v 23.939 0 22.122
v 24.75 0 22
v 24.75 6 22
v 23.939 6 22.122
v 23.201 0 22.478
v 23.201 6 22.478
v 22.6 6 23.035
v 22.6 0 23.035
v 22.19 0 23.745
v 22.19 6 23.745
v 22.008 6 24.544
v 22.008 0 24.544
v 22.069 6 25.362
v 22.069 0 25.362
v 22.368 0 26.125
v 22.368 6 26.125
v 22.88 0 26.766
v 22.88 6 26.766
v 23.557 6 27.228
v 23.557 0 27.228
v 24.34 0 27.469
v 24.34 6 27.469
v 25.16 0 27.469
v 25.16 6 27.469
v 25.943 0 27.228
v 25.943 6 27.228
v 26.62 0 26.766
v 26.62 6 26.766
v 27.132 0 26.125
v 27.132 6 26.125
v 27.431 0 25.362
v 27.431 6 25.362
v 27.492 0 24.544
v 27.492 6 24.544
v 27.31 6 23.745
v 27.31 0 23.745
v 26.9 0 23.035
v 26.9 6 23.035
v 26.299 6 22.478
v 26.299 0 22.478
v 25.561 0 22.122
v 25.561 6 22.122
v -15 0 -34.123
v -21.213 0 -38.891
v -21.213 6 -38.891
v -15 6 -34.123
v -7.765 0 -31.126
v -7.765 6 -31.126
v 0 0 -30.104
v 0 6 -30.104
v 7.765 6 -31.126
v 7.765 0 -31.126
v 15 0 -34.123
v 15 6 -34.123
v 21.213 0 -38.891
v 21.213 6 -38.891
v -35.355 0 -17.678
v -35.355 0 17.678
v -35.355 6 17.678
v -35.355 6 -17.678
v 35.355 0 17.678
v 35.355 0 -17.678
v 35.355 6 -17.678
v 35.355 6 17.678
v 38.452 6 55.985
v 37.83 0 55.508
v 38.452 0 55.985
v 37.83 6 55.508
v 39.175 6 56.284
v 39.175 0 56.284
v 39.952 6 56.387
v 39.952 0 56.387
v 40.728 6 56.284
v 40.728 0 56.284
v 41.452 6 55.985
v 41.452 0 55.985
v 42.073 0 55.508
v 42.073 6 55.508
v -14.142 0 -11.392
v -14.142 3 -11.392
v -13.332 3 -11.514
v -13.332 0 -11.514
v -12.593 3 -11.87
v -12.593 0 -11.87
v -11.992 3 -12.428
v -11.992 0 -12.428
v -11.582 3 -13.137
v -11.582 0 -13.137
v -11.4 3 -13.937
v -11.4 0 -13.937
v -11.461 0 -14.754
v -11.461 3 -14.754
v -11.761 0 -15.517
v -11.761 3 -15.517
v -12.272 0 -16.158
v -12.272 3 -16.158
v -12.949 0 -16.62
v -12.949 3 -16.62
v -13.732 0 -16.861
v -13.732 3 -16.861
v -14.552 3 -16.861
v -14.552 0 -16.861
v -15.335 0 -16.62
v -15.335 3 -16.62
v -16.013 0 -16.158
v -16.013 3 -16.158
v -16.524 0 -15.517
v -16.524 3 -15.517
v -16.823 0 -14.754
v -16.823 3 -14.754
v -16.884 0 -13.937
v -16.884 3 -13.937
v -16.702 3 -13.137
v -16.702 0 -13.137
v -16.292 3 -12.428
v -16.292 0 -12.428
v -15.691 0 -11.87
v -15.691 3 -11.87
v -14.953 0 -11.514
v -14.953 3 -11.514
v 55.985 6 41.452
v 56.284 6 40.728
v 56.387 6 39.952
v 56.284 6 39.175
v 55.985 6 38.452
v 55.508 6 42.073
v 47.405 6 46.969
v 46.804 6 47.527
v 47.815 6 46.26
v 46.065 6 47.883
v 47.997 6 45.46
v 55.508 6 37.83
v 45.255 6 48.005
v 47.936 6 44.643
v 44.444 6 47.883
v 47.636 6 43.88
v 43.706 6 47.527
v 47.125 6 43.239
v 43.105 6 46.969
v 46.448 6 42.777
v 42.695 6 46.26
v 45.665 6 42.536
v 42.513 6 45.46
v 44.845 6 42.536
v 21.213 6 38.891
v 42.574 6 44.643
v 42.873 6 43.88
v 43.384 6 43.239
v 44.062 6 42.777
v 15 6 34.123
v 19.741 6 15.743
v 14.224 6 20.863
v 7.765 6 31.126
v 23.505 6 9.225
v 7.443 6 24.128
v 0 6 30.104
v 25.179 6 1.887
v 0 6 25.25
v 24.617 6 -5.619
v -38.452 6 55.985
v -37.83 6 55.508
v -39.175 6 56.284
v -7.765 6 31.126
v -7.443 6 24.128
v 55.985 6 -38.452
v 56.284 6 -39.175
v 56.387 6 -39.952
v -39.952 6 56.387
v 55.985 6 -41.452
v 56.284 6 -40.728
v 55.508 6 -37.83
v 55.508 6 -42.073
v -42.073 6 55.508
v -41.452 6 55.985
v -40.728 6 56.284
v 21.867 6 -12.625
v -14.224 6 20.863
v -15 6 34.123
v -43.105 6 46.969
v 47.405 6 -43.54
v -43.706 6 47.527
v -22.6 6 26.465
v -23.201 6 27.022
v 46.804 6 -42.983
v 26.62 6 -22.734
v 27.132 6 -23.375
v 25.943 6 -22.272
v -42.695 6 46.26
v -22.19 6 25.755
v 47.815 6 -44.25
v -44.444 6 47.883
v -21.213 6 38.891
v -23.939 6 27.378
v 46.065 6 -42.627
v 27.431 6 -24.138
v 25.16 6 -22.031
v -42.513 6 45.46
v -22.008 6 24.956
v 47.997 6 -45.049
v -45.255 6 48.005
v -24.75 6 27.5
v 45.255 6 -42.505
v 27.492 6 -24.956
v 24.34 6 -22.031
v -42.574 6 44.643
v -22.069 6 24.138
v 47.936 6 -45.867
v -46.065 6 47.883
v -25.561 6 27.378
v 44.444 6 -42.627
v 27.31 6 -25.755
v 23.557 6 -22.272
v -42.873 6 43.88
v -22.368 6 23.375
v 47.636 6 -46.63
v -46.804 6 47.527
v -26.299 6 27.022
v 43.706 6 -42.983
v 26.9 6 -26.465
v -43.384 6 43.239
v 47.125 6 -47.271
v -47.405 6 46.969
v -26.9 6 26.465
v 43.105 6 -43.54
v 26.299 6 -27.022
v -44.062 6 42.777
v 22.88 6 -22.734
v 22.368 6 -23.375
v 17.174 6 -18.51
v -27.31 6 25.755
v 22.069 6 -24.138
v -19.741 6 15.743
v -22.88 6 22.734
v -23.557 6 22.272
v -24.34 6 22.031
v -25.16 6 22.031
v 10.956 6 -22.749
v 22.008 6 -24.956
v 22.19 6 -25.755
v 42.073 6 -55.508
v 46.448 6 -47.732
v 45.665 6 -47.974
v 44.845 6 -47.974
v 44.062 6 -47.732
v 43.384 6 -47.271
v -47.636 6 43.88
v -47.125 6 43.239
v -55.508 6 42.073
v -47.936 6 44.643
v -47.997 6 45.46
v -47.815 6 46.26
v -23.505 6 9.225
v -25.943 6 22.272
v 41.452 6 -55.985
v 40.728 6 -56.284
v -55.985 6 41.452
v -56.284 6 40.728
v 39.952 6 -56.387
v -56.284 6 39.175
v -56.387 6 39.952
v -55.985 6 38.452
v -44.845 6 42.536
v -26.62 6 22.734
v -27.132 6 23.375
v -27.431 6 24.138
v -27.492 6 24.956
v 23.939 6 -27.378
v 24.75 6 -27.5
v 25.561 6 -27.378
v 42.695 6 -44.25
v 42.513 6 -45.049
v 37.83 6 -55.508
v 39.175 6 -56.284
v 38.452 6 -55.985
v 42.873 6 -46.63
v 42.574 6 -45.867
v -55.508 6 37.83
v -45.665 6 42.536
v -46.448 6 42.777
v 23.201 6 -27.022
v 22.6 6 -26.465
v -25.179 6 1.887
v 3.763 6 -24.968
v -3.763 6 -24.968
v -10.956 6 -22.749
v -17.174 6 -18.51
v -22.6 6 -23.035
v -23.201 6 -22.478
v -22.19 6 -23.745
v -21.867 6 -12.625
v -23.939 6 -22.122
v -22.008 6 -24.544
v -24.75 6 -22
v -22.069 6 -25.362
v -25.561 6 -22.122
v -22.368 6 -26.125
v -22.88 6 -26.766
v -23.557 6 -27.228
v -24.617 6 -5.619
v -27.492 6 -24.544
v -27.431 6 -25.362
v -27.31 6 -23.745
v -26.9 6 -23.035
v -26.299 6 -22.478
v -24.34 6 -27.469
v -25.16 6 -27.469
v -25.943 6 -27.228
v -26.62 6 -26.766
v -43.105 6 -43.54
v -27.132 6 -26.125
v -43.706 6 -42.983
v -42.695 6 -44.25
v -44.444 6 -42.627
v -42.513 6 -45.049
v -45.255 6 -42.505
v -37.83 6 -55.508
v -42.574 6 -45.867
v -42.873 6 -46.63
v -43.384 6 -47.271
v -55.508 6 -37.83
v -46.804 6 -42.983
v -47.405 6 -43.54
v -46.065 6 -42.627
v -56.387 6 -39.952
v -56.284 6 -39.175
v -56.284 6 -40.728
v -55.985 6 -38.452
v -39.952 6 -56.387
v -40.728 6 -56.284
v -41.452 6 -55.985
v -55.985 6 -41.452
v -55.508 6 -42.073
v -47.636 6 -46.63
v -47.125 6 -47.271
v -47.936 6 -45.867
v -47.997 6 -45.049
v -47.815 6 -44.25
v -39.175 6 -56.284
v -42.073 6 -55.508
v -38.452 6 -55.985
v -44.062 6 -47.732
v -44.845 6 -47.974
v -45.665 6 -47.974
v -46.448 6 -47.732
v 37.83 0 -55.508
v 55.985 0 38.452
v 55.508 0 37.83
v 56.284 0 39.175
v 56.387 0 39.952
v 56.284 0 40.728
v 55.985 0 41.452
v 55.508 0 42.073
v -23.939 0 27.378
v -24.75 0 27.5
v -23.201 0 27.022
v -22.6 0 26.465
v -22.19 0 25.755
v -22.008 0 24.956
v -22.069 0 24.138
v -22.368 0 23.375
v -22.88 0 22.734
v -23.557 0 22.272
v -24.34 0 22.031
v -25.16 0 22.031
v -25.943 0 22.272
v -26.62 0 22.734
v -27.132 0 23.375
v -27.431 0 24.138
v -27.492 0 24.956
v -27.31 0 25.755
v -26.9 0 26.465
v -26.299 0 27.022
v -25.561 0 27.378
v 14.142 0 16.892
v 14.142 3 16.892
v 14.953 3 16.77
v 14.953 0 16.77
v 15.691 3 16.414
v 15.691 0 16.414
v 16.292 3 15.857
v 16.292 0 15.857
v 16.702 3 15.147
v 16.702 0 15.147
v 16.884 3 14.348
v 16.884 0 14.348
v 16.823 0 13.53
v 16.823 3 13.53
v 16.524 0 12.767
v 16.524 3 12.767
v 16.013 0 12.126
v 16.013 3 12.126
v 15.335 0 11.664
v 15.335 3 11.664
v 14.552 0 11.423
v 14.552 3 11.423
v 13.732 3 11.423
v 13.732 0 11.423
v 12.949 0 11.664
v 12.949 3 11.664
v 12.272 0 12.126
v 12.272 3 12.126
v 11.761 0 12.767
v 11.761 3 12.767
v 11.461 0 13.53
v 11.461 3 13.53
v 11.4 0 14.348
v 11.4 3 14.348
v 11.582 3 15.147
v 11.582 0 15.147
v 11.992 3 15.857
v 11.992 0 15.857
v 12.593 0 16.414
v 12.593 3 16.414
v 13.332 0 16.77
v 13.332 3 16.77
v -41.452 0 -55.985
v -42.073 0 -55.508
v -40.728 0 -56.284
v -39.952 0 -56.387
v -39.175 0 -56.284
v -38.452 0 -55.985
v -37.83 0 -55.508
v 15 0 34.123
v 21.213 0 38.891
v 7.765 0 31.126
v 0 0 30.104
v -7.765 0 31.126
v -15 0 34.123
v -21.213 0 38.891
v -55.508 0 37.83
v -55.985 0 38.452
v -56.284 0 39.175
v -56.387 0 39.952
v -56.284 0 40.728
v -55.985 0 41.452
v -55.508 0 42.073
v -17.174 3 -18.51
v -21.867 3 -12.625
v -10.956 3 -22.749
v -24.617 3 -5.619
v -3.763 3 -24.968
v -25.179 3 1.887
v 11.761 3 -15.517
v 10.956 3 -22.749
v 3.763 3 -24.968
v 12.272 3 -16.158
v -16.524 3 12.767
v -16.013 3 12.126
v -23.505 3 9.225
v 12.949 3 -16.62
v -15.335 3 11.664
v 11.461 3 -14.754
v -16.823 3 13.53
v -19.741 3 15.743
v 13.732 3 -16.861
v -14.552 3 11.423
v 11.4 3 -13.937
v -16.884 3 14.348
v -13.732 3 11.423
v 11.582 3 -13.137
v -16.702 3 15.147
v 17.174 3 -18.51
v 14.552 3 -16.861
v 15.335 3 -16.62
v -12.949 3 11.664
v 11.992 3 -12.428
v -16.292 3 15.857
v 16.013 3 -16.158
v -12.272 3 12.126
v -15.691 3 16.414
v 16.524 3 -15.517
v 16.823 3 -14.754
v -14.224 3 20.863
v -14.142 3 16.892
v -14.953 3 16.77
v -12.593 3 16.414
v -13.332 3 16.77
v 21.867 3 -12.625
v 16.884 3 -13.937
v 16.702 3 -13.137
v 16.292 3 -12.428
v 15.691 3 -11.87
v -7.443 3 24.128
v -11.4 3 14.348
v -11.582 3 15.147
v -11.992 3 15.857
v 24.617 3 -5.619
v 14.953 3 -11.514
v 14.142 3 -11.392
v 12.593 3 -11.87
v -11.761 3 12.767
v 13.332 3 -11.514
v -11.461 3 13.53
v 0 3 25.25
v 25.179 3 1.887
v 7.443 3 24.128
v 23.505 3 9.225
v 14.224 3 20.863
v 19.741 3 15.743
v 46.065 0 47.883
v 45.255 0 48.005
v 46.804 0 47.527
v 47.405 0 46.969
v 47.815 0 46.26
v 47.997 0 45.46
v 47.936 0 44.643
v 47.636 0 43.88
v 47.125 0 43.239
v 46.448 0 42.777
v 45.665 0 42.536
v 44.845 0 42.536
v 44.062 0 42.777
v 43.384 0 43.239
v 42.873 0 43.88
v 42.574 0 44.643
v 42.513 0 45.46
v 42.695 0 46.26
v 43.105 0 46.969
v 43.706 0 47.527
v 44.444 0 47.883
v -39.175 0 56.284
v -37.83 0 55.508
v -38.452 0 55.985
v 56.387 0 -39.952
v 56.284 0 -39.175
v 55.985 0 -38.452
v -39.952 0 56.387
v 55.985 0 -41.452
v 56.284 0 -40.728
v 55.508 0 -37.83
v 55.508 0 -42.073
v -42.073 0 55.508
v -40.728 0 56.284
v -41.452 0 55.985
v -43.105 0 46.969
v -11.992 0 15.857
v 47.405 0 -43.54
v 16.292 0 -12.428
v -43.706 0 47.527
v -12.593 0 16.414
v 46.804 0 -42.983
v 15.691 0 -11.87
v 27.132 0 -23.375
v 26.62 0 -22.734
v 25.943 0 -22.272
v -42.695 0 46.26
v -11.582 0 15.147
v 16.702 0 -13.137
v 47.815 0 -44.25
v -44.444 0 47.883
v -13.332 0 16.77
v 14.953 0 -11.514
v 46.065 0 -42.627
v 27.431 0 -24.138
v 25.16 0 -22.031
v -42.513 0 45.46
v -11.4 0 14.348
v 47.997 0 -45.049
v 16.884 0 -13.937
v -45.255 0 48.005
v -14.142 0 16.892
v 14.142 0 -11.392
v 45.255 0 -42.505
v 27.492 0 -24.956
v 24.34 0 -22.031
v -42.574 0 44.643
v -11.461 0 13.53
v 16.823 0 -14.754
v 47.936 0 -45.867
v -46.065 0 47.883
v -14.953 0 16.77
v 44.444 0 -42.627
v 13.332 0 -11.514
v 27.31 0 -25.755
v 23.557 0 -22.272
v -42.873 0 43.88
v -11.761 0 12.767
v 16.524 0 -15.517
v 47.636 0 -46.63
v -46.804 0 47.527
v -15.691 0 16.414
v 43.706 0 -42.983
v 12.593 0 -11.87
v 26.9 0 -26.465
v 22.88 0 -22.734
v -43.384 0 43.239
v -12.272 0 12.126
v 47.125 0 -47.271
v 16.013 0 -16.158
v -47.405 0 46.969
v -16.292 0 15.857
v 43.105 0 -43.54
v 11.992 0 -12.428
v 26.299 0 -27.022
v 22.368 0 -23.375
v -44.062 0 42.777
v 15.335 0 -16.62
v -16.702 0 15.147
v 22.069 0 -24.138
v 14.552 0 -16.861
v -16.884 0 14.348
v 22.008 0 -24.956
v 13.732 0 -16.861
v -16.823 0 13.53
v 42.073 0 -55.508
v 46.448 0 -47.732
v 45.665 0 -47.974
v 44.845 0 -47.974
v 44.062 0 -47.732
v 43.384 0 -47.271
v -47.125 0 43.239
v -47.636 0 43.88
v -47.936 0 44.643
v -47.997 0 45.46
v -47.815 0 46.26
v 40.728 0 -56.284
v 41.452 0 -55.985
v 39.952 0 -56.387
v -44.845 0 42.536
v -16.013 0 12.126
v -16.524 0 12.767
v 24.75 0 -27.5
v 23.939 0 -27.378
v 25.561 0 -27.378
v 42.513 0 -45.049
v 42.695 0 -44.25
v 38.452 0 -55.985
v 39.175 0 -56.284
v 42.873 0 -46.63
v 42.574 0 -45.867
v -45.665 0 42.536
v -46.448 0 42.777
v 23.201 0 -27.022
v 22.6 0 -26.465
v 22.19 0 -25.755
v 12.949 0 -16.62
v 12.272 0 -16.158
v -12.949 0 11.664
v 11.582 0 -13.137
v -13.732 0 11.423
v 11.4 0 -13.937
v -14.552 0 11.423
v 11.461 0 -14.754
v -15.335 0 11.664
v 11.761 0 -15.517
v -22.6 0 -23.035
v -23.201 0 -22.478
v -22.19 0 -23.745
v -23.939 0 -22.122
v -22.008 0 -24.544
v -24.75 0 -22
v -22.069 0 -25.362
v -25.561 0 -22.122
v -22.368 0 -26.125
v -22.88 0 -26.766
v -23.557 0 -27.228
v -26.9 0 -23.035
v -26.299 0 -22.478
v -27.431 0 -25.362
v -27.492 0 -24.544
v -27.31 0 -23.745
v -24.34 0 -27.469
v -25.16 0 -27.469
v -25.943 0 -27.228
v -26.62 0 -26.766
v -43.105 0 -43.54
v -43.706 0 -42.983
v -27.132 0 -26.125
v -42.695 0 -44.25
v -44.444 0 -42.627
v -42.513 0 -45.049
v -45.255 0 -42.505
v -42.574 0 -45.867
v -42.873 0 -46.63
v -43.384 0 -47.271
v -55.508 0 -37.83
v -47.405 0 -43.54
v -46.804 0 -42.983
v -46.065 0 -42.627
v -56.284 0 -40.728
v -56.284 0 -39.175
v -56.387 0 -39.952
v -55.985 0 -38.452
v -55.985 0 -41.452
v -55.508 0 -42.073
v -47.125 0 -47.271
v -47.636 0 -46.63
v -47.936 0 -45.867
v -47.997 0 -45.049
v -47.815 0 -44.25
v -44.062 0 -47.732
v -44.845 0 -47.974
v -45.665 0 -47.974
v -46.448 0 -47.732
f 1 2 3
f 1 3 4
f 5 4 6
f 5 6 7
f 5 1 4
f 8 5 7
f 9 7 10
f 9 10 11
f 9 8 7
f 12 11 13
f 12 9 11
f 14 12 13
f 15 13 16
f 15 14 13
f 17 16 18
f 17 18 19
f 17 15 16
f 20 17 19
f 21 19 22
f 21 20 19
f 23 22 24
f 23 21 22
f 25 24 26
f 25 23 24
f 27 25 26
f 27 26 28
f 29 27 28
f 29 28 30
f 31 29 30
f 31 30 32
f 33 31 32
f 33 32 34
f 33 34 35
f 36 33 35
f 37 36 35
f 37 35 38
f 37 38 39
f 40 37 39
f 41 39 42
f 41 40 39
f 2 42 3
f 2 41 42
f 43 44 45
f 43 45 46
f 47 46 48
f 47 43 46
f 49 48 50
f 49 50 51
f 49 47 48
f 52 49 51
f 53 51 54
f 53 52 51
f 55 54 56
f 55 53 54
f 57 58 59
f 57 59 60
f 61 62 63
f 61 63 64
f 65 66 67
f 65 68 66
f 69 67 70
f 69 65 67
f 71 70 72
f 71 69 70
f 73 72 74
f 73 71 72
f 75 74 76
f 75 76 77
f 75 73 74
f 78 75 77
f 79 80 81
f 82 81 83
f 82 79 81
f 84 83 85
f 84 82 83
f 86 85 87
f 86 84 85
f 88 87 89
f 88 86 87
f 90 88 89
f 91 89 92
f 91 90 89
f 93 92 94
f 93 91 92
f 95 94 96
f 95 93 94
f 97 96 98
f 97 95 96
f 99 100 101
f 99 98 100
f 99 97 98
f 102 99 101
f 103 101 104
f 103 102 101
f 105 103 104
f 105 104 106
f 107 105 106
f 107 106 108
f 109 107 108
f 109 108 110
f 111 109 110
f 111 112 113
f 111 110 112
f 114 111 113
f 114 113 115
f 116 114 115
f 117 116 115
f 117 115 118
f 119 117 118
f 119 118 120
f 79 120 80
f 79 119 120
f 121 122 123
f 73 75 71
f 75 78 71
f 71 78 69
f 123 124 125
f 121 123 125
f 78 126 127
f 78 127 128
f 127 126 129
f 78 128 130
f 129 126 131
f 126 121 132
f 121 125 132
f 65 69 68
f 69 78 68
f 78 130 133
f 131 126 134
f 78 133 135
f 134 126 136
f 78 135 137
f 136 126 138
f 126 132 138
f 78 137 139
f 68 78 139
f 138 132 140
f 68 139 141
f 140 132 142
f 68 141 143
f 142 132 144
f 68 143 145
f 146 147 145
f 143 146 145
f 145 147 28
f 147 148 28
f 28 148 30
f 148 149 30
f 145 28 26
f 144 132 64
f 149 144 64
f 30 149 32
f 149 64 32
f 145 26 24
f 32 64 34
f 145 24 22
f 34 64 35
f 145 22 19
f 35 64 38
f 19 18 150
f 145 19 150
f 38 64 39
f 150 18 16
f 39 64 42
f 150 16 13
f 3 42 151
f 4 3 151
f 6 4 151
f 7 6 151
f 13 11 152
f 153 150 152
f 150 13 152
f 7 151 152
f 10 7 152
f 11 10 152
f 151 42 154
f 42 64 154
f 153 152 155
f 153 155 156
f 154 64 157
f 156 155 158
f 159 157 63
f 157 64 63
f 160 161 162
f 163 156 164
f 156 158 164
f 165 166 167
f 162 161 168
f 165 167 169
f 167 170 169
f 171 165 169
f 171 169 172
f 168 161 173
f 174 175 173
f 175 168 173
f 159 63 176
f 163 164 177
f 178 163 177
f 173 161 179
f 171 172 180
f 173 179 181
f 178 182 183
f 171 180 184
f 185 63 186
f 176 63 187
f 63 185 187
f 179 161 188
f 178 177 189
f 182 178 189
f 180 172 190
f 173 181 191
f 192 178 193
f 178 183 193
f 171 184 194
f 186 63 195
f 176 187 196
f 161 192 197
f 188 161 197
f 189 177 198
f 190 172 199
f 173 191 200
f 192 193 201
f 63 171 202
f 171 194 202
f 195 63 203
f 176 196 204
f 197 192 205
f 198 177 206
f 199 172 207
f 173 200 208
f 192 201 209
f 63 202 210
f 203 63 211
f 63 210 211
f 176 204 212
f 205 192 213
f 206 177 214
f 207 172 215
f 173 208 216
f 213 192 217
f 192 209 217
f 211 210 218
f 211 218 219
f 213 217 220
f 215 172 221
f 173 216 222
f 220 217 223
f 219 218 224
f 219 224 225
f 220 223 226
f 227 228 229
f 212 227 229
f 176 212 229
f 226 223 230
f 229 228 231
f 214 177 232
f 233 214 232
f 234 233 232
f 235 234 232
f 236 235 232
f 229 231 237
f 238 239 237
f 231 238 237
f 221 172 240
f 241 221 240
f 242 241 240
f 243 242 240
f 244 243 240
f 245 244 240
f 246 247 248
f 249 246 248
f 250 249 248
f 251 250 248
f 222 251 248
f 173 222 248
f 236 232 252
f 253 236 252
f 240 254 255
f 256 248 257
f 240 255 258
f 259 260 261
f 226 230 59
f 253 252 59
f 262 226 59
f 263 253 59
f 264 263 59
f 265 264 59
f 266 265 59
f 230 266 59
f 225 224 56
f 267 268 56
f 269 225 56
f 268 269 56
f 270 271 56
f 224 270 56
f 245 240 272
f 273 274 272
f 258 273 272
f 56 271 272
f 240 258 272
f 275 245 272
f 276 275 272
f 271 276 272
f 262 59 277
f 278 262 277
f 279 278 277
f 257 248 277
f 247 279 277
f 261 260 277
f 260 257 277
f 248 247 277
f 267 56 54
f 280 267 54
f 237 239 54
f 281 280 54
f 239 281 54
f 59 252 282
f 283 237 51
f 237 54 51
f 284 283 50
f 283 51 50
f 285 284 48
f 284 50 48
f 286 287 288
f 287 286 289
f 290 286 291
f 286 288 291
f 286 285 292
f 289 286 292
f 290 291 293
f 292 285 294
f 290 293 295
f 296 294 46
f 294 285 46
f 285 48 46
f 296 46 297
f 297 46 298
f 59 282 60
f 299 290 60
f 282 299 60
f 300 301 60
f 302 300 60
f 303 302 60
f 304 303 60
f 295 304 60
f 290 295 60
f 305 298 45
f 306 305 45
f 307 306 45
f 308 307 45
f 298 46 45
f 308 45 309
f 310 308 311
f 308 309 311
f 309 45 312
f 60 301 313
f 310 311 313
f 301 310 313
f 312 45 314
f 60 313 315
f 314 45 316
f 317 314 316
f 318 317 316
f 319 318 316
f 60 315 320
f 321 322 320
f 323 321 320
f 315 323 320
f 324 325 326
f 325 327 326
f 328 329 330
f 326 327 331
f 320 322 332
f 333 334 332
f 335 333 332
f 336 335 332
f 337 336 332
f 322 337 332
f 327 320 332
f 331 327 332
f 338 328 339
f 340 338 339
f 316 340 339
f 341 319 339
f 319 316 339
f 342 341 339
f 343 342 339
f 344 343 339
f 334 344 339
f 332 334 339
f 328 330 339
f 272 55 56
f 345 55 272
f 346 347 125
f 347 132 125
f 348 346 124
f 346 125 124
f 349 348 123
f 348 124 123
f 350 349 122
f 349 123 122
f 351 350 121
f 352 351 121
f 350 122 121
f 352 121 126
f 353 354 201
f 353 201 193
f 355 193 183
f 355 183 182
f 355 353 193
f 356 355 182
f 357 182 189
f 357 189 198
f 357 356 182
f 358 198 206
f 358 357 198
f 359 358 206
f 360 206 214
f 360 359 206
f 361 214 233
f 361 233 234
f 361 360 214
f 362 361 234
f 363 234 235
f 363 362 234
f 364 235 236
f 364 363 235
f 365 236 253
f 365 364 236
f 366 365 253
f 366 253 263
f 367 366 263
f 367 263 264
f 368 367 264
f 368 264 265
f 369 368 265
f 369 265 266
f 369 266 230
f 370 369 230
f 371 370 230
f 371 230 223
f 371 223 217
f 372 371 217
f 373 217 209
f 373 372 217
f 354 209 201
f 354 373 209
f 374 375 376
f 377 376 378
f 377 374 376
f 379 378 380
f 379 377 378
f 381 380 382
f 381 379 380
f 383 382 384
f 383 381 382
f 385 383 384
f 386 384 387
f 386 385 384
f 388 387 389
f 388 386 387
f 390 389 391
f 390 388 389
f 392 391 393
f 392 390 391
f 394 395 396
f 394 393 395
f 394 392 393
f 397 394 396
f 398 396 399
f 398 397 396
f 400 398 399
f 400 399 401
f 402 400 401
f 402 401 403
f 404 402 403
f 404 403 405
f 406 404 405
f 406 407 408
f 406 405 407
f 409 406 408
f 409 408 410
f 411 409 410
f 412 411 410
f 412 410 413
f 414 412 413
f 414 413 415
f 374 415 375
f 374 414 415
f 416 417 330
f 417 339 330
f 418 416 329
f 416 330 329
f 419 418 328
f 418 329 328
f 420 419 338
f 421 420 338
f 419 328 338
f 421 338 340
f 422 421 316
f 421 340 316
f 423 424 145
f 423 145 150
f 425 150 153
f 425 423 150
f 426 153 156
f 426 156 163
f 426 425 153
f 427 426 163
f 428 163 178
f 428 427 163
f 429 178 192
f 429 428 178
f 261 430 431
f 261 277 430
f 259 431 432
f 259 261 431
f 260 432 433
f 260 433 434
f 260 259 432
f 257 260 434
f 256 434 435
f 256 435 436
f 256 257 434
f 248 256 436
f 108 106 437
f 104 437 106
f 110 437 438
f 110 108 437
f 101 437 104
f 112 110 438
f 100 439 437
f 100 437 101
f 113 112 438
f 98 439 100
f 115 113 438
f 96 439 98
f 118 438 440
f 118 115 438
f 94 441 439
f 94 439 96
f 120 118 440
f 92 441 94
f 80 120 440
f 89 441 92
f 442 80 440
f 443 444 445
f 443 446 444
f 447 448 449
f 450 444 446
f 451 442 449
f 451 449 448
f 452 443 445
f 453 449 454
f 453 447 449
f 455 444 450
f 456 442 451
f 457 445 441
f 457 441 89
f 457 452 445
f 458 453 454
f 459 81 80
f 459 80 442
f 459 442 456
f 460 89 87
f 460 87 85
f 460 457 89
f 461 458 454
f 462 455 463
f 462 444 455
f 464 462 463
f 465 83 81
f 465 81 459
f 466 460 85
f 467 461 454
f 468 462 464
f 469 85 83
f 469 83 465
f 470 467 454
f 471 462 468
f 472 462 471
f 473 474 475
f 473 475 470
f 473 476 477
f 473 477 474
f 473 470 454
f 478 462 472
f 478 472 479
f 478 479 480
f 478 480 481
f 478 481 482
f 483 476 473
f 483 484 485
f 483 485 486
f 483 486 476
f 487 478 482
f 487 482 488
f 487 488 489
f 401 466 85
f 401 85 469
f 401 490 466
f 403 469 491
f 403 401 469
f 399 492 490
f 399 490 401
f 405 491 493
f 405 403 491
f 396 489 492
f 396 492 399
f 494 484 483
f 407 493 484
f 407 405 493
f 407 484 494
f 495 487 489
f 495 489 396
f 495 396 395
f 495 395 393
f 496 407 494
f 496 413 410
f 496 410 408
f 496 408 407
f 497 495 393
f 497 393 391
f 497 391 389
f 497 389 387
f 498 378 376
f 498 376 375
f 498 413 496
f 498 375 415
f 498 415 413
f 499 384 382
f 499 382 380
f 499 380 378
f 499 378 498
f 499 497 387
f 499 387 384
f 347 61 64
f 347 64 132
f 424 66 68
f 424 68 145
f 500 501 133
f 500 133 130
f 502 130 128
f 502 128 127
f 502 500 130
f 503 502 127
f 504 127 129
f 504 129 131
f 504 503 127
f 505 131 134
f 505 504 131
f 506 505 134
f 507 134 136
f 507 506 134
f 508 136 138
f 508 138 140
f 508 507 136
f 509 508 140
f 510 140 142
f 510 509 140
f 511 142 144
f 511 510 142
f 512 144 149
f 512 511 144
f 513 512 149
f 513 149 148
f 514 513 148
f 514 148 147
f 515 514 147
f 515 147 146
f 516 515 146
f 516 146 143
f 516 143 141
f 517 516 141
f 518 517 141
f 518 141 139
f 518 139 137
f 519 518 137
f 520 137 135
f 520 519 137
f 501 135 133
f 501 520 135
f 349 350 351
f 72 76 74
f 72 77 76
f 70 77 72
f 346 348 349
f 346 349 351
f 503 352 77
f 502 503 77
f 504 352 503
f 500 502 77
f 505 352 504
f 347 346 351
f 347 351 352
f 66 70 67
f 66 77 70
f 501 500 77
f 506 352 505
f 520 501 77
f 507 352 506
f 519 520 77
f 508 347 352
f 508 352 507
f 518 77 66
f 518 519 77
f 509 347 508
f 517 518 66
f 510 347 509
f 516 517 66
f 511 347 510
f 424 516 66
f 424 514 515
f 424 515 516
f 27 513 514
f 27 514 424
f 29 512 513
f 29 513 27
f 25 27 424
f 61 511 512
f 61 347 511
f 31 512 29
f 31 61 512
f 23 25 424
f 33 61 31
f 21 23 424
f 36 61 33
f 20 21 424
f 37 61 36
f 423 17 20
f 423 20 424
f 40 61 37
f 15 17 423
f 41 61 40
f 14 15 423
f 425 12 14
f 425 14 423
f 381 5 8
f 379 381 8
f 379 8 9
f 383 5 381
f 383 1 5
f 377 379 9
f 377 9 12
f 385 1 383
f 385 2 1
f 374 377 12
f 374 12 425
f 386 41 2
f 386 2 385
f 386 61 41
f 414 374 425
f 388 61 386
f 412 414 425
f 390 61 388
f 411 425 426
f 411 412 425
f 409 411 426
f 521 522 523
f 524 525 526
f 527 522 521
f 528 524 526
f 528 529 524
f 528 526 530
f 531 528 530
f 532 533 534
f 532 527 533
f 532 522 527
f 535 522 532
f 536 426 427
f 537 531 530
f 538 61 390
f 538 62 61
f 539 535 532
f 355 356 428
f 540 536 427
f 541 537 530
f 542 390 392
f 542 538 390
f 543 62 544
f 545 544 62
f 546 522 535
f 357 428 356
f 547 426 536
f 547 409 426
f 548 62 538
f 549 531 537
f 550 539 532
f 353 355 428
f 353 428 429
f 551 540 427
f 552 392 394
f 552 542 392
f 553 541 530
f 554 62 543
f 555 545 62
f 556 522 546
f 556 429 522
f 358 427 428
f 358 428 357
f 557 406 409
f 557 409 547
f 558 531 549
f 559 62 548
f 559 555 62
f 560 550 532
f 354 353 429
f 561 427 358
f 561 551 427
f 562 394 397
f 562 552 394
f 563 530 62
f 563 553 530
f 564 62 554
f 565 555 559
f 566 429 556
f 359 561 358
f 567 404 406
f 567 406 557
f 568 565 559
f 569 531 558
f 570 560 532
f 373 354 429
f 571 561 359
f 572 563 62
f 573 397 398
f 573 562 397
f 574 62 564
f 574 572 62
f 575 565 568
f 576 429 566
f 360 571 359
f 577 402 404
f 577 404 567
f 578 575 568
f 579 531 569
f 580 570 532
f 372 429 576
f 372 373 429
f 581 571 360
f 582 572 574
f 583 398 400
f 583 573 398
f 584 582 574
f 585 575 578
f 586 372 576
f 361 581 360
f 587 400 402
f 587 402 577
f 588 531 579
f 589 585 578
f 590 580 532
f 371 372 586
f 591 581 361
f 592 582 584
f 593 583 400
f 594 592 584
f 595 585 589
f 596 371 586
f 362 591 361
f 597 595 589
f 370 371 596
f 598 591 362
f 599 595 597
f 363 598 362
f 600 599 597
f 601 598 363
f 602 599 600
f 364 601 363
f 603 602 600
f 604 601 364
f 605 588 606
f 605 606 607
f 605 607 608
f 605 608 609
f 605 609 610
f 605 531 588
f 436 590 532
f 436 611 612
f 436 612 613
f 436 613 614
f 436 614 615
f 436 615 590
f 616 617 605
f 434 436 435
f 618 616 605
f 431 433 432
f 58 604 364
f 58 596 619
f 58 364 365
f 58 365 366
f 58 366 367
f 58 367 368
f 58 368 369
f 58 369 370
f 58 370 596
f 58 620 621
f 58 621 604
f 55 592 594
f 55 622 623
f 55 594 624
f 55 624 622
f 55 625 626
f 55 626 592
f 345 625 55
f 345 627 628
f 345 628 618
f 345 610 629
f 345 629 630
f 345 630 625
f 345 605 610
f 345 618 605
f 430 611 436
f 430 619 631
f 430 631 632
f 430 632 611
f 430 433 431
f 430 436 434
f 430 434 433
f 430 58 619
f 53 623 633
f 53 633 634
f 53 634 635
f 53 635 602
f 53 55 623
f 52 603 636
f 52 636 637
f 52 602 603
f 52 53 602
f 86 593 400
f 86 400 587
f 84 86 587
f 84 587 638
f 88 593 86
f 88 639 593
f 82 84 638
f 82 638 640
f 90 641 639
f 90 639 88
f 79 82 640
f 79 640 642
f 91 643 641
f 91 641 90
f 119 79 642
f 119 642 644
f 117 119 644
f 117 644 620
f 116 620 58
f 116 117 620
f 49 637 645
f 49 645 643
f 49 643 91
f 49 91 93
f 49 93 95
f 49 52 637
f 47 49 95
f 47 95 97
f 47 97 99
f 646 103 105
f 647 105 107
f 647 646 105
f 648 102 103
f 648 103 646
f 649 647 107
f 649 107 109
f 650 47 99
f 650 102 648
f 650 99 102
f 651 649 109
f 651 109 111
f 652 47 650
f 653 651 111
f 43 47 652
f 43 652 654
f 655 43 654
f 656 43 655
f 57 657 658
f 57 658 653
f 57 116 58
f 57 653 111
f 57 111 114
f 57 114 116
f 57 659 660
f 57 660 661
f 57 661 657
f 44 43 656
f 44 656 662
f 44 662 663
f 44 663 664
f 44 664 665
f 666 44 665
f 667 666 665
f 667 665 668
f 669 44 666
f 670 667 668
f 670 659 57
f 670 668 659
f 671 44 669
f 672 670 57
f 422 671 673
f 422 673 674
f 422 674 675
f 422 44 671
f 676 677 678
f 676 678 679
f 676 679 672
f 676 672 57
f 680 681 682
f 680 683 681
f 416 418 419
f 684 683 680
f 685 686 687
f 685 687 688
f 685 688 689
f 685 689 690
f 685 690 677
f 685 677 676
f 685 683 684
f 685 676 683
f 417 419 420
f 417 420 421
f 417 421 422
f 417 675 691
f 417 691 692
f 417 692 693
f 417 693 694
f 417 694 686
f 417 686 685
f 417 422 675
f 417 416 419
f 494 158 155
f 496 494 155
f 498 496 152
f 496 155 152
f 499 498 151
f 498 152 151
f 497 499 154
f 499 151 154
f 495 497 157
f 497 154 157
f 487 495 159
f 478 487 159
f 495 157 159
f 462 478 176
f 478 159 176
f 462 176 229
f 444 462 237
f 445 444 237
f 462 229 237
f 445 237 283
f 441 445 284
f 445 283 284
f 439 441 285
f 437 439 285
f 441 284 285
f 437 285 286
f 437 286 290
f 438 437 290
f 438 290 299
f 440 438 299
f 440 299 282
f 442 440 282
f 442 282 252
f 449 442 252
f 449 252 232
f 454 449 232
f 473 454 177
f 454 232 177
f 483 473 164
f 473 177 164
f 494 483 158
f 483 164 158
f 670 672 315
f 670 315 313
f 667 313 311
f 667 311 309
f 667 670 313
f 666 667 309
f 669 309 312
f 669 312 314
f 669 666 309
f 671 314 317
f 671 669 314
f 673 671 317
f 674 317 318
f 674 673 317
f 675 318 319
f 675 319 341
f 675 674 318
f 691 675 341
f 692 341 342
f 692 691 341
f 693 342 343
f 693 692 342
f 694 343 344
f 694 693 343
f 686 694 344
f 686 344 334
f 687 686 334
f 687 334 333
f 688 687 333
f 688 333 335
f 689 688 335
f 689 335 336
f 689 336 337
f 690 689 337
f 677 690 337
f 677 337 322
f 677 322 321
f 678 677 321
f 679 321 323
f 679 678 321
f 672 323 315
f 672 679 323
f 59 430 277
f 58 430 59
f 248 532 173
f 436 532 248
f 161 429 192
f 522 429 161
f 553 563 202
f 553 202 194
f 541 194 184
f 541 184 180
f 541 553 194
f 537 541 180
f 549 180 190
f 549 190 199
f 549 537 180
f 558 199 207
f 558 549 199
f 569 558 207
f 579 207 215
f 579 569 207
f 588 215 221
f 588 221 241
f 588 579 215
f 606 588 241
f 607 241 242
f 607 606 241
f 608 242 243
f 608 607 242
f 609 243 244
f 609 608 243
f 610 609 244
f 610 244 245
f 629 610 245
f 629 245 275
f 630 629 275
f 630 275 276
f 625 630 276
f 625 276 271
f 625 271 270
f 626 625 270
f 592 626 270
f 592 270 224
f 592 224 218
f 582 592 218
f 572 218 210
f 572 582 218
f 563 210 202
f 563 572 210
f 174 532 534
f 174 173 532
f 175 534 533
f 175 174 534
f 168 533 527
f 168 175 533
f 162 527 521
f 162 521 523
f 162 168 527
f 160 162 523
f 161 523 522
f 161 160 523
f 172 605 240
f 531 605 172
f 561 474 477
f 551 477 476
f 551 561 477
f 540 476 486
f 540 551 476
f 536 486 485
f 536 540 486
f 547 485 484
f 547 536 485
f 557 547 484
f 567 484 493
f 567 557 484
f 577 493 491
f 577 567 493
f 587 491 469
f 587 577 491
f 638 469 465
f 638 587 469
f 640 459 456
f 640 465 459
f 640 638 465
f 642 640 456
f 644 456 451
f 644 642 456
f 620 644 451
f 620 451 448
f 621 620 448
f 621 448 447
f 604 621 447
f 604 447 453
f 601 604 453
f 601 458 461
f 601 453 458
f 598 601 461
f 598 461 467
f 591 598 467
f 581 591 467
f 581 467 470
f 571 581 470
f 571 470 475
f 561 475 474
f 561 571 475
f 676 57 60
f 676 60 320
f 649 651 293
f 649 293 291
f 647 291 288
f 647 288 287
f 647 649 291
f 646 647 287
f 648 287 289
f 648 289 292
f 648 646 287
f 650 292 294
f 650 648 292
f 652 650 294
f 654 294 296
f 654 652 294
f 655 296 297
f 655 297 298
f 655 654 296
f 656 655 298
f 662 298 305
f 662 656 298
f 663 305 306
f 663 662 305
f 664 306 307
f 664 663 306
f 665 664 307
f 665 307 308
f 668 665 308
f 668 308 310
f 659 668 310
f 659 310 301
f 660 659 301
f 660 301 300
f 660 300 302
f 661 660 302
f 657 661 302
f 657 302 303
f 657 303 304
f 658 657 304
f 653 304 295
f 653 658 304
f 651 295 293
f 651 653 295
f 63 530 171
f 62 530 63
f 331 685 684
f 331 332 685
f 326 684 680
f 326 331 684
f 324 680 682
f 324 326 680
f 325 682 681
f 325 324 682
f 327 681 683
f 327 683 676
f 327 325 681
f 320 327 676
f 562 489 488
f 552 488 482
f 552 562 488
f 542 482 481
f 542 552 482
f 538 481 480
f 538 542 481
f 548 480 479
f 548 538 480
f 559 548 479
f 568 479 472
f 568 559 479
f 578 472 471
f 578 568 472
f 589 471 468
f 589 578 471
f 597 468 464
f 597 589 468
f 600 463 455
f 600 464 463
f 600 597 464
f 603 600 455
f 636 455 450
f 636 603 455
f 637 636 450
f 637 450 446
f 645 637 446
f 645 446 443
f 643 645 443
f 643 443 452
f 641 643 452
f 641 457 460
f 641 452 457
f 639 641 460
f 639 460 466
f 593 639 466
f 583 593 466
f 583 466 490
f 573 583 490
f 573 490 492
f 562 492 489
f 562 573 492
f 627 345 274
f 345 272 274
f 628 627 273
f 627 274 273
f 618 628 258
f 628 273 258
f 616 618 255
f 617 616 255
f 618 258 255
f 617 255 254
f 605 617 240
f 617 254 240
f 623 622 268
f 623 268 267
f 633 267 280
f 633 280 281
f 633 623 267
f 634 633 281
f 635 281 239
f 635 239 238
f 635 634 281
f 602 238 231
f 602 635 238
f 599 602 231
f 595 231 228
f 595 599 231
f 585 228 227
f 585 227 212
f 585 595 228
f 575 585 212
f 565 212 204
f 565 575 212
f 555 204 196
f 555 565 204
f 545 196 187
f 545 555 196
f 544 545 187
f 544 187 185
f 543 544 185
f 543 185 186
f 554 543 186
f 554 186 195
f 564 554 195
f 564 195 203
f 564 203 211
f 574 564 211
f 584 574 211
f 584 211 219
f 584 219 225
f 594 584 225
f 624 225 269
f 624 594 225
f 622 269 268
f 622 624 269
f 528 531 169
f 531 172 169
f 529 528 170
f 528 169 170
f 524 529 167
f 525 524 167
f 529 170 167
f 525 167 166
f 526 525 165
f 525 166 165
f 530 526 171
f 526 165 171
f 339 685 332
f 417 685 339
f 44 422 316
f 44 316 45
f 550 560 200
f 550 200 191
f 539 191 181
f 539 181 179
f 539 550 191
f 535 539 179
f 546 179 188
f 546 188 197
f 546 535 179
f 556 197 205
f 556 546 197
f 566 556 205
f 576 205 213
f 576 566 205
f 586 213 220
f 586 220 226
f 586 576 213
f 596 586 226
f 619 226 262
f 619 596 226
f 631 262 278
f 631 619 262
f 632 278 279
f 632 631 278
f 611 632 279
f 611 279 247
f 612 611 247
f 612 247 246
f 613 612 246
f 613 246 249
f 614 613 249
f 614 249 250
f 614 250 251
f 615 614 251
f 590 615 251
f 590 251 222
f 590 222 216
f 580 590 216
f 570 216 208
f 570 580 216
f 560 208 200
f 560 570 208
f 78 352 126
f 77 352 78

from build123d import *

# Parameters (mm, degrees)
SKETCH1_R           = 2.75
BOSS_EXTRUDE1_DEPTH = 6
FILLET1_R           = 3
SKETCH2_R           = 25.25
CUT_EXTRUDE1_DEPTH  = 3


with BuildPart() as part:
    # Sketch1 → Boss-Extrude1 (new body)
    with BuildSketch(Plane(origin=(0, 0, 0), x_dir=(1, 0, 0), z_dir=(0, 1, 0))):
        with BuildLine():
            Line((-57.629202667, 39.951533137), (-39.951533137, 57.629202667))
            Line((-39.951533137, 57.629202667), (-21.213203436, 38.890872965))
            ThreePointArc((-21.213203436, 38.890872965), (0, 30.104076401), (21.213203436, 38.890872965))
            Line((21.213203436, 38.890872965), (39.951533137, 57.629202667))
            Line((39.951533137, 57.629202667), (57.629202667, 39.951533137))
            Line((57.629202667, 39.951533137), (35.355339059, 17.67766953))
            Line((35.355339059, 17.67766953), (35.355339059, -17.67766953))
            Line((35.355339059, -17.67766953), (57.629202667, -39.951533137))
            Line((57.629202667, -39.951533137), (39.951533137, -57.629202667))
            Line((39.951533137, -57.629202667), (21.213203436, -38.890872965))
            ThreePointArc((21.213203436, -38.890872965), (0, -30.104076401), (-21.213203436, -38.890872965))
            Line((-21.213203436, -38.890872965), (-39.951533137, -57.629202667))
            Line((-39.951533137, -57.629202667), (-57.629202667, -39.951533137))
            Line((-57.629202667, -39.951533137), (-35.355339059, -17.67766953))
            Line((-35.355339059, -17.67766953), (-35.355339059, 17.67766953))
            Line((-35.355339059, 17.67766953), (-57.629202667, 39.951533137))
        make_face()
        with Locations(Location((-45.254833996, 45.254833996, 0), (0, 0, 270))):
            Circle(SKETCH1_R, mode=Mode.SUBTRACT)
        with Locations(Location((45.254833996, 45.254833996, 0), (0, 0, 270))):
            Circle(SKETCH1_R, mode=Mode.SUBTRACT)
        with Locations(Location((45.254833996, -45.254833996, 0), (0, 0, 270))):
            Circle(SKETCH1_R, mode=Mode.SUBTRACT)
        with Locations(Location((-45.254833996, -45.254833996, 0), (0, 0, 270))):
            Circle(SKETCH1_R, mode=Mode.SUBTRACT)
        with Locations(Location((-24.75, 24.75, 0), (0, 0, 270))):
            Circle(SKETCH1_R, mode=Mode.SUBTRACT)
        with Locations(Location((-24.75, -24.75, 0), (0, 0, 270))):
            Circle(SKETCH1_R, mode=Mode.SUBTRACT)
        with Locations(Location((24.75, -24.75, 0), (0, 0, 90))):
            Circle(SKETCH1_R, mode=Mode.SUBTRACT)
        with Locations(Location((24.75, 24.75, 0), (0, 0, 90))):
            Circle(SKETCH1_R, mode=Mode.SUBTRACT)
        with Locations(Location((-14.142135624, 14.142135624, 0), (0, 0, 270))):
            Circle(SKETCH1_R, mode=Mode.SUBTRACT)
        with Locations(Location((14.142135624, 14.142135624, 0), (0, 0, 270))):
            Circle(SKETCH1_R, mode=Mode.SUBTRACT)
        with Locations(Location((14.142135624, -14.142135624, 0), (0, 0, 270))):
            Circle(SKETCH1_R, mode=Mode.SUBTRACT)
        with Locations(Location((-14.142135624, -14.142135624, 0), (0, 0, 270))):
            Circle(SKETCH1_R, mode=Mode.SUBTRACT)
    extrude(amount=BOSS_EXTRUDE1_DEPTH)

    # Fillet1
    fillet1_edges = [part.edges().sort_by_distance(p)[0] for p in [
        (-57.629202667, 3, -39.951533137),
        (-39.951533137, 3, -57.629202667),
        (39.951533137, 3, -57.629202667),
        (57.629202667, 3, -39.951533137),
        (57.629202667, 3, 39.951533137),
        (39.951533137, 3, 57.629202667),
        (-39.951533137, 3, 57.629202667),
        (-57.629202667, 3, 39.951533137),
    ]]
    fillet(fillet1_edges, radius=FILLET1_R)

    # Sketch2 → Cut-Extrude1 (cut)
    with BuildSketch(Plane(origin=(0, 6, 0), x_dir=(1, 0, 0), z_dir=(0, 1, 0))):
        with Locations(Location((0, 0, 0), (0, 0, 270))):
            Circle(SKETCH2_R)
    extrude(amount=-CUT_EXTRUDE1_DEPTH, mode=Mode.SUBTRACT)


solid = part.part
